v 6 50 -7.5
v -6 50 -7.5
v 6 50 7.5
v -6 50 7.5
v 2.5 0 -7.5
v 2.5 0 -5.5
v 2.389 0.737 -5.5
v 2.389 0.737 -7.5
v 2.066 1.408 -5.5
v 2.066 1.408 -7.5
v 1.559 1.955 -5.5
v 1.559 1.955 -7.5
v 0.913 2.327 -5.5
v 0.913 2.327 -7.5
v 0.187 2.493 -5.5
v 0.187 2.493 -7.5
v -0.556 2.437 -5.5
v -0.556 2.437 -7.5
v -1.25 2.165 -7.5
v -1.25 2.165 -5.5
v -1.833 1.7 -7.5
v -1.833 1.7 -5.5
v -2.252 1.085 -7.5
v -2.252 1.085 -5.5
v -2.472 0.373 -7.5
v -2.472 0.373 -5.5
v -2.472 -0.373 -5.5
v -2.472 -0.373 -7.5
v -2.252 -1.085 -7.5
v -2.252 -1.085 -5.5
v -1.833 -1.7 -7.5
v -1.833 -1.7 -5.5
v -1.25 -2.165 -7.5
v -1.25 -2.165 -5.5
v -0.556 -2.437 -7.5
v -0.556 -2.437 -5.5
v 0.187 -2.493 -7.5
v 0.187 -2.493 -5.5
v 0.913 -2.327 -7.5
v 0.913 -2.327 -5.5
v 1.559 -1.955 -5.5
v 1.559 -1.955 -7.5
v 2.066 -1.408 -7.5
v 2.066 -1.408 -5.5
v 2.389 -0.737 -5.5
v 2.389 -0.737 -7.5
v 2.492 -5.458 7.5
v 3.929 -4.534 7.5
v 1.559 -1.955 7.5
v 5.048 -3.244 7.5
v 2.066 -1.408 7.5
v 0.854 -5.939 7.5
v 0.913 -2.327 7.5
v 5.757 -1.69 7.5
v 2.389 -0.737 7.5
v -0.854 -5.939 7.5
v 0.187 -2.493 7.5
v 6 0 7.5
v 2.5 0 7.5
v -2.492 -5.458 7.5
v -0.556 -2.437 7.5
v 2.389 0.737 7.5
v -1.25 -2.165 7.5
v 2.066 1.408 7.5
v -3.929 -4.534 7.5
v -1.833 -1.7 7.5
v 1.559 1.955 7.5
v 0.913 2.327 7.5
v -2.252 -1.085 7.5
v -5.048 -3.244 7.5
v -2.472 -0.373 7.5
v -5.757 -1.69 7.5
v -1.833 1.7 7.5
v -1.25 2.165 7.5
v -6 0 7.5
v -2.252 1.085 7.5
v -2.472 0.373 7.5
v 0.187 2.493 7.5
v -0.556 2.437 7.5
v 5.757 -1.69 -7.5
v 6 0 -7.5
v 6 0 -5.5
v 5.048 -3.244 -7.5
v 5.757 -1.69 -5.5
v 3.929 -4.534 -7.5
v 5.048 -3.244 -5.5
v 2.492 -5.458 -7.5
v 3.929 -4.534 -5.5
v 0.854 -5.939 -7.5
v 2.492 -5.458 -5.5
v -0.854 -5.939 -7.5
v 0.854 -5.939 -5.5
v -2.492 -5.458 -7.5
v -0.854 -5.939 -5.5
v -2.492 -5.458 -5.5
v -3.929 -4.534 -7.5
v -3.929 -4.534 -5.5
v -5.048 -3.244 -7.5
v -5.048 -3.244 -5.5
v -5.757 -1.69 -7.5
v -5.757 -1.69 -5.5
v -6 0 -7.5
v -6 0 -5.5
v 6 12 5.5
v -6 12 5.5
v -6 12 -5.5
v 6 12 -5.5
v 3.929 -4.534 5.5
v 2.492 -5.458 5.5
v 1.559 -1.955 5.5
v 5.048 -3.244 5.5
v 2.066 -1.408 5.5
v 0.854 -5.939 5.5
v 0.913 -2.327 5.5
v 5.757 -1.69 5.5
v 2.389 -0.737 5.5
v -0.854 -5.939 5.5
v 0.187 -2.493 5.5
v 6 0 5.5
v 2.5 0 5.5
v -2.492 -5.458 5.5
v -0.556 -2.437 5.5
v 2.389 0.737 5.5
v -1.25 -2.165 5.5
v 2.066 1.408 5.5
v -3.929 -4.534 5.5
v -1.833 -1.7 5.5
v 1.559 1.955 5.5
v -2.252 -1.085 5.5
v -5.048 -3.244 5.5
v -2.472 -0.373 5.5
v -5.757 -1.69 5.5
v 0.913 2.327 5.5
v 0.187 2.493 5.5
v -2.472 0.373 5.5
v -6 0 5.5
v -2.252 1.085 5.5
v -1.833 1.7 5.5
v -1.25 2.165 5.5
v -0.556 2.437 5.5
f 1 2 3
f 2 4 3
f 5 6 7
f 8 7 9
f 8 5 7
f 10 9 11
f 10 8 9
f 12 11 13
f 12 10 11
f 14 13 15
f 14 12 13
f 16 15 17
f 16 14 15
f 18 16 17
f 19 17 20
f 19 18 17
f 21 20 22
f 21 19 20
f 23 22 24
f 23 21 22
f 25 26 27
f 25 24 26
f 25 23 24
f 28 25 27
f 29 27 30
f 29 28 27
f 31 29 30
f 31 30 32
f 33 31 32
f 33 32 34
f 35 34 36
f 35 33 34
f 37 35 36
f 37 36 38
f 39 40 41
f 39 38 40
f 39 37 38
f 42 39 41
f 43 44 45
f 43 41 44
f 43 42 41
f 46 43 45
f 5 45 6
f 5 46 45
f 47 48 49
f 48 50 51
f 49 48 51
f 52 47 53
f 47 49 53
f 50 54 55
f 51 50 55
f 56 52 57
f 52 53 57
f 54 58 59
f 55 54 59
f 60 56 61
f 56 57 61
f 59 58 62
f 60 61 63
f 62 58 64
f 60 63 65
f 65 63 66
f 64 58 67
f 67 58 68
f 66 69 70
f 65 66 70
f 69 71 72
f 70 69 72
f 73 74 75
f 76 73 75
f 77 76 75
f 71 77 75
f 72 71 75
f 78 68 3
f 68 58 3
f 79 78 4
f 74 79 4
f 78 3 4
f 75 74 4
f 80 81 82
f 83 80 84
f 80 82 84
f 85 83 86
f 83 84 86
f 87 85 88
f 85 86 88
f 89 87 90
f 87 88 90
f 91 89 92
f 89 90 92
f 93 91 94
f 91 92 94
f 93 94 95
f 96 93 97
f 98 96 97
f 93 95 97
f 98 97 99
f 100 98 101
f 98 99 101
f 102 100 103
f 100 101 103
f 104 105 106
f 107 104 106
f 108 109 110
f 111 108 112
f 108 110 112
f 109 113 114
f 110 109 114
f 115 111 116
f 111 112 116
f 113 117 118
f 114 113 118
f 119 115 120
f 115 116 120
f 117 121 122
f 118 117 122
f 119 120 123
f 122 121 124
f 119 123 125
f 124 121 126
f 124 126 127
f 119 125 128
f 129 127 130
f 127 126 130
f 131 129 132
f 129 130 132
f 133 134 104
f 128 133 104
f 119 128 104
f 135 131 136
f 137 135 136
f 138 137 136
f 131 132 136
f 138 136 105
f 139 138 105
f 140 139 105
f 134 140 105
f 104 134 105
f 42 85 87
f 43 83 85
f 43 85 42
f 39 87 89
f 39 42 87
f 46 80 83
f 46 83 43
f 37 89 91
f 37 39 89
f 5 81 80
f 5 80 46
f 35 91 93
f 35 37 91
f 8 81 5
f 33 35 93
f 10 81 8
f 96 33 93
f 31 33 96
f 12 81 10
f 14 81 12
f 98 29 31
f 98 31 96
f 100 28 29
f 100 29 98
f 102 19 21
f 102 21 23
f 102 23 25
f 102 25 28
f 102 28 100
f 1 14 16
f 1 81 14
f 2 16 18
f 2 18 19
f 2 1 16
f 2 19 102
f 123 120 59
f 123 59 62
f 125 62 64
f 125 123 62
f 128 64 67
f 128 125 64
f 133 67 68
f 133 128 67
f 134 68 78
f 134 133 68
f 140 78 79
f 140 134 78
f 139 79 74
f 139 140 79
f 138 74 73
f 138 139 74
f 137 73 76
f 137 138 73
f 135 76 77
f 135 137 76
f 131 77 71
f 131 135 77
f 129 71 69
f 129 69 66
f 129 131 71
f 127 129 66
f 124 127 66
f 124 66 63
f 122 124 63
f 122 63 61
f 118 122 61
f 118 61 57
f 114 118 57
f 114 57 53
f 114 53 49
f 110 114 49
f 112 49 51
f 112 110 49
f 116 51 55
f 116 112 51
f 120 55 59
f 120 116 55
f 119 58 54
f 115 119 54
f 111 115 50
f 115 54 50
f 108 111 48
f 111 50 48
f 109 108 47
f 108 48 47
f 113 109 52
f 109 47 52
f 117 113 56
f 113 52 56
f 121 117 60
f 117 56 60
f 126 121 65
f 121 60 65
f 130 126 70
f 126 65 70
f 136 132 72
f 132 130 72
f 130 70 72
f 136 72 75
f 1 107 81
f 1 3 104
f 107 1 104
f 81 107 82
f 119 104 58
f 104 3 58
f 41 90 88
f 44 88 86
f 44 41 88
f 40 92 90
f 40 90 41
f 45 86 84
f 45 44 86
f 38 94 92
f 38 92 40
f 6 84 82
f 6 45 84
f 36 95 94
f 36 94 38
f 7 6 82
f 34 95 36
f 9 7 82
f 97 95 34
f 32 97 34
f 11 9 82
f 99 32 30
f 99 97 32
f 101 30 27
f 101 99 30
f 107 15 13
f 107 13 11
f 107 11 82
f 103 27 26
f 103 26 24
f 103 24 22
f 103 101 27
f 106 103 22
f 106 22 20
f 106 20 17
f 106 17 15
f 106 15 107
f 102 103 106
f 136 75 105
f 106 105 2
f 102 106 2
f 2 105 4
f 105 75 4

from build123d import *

# Parameters (mm, degrees)
SKETCH1_R               = 2.5
BOSS_EXTRUDE2_DEPTH     = 7.5
CUT_EXTRUDE1_DEPTH      = 51.914143418
CUT_EXTRUDE1_DEPTH_BACK = 51.914143418
SKETCH2_W               = 11
SKETCH2_H               = 34.501138588


with BuildPart() as part:
    # Sketch1 → Boss-Extrude2 (new, symmetric)
    with BuildSketch(Plane.XY):
        with BuildLine():
            Line((-6, 0), (-6, 50))
            Line((-6, 50), (6, 50))
            Line((6, 50), (6, 0))
            ThreePointArc((6, 0), (0, -6), (-6, 0))
        make_face()
        Circle(SKETCH1_R, mode=Mode.SUBTRACT)
    extrude(amount=BOSS_EXTRUDE2_DEPTH, both=True)

    # Sketch2 → Cut-Extrude1 (cut, two sides: drawn at the far end of the back side and taken through both)
    with BuildSketch(Plane(origin=(0, 0, 0), x_dir=(0, 0, -1), z_dir=(1, 0, 0)).offset(-CUT_EXTRUDE1_DEPTH_BACK)):
        with Locations((0, -5.250569294)):
            Rectangle(SKETCH2_W, SKETCH2_H)
    extrude(amount=CUT_EXTRUDE1_DEPTH + CUT_EXTRUDE1_DEPTH_BACK, mode=Mode.SUBTRACT)


solid = part.part
